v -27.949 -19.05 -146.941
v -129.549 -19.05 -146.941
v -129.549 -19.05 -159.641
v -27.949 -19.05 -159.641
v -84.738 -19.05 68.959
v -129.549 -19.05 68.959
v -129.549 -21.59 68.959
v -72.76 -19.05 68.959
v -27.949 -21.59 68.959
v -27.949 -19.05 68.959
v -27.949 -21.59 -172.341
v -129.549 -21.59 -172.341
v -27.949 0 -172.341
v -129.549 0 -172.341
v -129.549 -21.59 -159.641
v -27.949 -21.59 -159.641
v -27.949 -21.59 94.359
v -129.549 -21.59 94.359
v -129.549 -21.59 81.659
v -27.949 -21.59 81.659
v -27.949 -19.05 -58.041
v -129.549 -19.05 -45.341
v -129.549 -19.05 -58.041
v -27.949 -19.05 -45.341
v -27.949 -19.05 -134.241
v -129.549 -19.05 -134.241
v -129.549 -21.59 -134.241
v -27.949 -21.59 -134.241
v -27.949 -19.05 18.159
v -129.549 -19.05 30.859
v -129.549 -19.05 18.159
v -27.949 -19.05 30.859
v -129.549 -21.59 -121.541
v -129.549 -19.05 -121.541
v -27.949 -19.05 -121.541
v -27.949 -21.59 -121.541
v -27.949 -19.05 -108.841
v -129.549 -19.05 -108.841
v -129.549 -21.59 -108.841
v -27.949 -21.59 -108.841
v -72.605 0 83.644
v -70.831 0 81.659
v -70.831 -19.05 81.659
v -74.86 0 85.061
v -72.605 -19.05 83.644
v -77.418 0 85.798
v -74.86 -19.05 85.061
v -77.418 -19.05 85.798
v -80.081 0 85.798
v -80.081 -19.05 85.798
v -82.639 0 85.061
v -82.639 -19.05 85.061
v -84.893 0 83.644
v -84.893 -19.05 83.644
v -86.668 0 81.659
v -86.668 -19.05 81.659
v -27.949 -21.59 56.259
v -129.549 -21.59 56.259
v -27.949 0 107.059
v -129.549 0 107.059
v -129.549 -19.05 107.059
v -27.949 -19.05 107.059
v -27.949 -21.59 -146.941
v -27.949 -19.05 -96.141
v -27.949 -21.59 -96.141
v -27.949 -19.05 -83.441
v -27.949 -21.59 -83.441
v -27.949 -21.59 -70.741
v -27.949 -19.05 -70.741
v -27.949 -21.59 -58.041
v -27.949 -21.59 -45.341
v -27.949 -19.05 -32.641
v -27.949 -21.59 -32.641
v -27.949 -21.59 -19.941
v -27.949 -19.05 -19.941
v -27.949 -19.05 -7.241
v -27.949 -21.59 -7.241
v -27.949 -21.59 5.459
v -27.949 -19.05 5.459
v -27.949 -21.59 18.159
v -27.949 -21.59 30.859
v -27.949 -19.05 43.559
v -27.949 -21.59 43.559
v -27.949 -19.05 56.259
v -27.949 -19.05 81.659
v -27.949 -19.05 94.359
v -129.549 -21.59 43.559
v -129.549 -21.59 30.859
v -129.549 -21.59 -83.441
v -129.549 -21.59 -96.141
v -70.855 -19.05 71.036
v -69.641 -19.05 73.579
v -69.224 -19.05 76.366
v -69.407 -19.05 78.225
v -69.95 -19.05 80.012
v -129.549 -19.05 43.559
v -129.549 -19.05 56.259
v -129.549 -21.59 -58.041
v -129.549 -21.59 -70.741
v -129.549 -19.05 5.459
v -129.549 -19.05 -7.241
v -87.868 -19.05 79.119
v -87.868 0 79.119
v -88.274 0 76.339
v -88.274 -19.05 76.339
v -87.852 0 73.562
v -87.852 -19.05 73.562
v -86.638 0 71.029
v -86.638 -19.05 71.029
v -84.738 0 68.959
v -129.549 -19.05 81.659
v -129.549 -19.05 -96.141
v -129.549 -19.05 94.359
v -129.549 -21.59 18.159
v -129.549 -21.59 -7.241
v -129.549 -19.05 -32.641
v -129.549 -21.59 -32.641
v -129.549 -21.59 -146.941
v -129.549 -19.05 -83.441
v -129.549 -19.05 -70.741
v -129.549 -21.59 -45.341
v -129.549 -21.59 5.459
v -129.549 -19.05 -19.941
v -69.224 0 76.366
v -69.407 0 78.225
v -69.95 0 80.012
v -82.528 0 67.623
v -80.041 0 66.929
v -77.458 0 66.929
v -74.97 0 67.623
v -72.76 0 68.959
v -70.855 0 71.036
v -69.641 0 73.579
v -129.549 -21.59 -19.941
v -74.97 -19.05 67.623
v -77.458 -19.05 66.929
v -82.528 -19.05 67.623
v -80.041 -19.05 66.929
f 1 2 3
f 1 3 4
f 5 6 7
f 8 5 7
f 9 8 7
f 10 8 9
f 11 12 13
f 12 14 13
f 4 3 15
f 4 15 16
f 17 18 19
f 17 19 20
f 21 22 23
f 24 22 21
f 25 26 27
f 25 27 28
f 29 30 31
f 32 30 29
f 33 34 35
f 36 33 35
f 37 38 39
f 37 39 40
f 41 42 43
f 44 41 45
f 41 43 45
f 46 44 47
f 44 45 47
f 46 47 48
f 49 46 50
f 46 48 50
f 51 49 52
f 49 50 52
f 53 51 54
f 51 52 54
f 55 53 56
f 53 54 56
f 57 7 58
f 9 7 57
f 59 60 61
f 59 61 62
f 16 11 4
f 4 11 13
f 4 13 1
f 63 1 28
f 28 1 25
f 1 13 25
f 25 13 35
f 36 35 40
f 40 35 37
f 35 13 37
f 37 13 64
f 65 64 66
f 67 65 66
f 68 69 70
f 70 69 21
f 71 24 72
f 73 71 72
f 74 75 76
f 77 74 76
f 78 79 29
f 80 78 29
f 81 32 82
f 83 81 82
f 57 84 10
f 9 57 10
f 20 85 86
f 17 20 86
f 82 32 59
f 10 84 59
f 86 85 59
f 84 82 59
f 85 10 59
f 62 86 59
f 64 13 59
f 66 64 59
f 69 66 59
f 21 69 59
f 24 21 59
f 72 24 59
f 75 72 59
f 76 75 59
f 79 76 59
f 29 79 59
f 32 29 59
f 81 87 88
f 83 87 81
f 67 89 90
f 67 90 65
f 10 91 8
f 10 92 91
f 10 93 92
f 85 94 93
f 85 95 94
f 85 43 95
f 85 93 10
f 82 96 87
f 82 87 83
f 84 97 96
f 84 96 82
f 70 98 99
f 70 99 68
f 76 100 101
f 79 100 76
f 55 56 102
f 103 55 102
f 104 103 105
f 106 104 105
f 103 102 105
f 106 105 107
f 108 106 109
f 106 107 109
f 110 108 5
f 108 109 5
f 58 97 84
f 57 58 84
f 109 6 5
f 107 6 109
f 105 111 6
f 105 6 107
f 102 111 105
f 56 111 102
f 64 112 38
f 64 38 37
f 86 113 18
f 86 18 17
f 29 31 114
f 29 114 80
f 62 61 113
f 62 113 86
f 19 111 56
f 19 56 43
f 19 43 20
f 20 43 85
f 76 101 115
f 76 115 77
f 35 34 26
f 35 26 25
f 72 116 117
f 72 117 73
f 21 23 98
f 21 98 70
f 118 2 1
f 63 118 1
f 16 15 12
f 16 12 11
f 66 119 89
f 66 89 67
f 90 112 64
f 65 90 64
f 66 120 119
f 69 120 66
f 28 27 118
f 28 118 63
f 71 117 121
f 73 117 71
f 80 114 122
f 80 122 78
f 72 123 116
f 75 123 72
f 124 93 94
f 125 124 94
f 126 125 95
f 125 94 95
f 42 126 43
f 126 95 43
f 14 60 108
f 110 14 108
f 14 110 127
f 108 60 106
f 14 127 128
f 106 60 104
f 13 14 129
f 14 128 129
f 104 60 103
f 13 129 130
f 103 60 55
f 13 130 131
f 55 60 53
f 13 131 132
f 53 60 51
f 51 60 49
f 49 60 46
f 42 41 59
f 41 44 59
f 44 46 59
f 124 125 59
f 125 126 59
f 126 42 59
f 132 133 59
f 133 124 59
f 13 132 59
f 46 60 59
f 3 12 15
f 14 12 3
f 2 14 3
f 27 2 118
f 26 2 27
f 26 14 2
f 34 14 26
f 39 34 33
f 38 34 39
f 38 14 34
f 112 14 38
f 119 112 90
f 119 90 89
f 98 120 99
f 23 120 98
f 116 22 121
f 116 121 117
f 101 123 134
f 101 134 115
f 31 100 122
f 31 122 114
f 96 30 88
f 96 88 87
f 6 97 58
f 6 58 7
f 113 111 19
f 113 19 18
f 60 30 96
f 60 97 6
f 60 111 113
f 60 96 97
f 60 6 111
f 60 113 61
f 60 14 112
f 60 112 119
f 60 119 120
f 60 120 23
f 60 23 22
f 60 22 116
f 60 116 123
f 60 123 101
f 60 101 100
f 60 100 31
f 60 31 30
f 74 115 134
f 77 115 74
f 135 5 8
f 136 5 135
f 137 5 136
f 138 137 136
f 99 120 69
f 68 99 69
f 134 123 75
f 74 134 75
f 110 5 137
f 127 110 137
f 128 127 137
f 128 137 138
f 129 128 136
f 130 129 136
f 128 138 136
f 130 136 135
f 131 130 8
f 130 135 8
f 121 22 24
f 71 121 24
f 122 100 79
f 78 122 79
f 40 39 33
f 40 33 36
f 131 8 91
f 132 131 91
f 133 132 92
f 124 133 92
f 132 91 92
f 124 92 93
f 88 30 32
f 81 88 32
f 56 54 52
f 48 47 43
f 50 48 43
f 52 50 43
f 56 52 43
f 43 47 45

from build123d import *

# Parameters (mm, degrees)
F0_W     = 101.6
F0_H     = 279.4
F1_DEPTH = 19.05
F2_W     = 101.6
F2_H     = 12.7
F3_DEPTH = 2.54
F5_DEPTH = 25.4


with BuildPart() as f1:
    # F0 (on Front) → F1 (new body)
    with BuildSketch(Plane.XZ):
        with Locations((-78.7492649078, -32.640619709)):
            Rectangle(F0_W, F0_H)
    extrude(amount=F1_DEPTH)

    # F2 (on face) → F3 (join)
    with BuildSketch(Plane.XZ.offset(19.05)):
        with Locations((-78.7492649078, -115.190619709)):
            Rectangle(F2_W, F2_H)
        with Locations((-78.7492649078, -89.790619709)):
            Rectangle(F2_W, F2_H)
        with Locations((-78.7492649078, -64.390619709)):
            Rectangle(F2_W, F2_H)
        with Locations((-78.7492649078, -38.990619709)):
            Rectangle(F2_W, F2_H)
        with Locations((-78.7492649078, -13.590619709)):
            Rectangle(F2_W, F2_H)
        with Locations((-78.7492649078, 11.809380291)):
            Rectangle(F2_W, F2_H)
        with Locations((-78.7492649078, 37.209380291)):
            Rectangle(F2_W, F2_H)
        with Locations((-78.7492649078, 62.609380291)):
            Rectangle(F2_W, F2_H)
        with Locations((-78.7492649078, 88.009380291)):
            Rectangle(F2_W, F2_H)
        with Locations((-78.7492649078, -140.590619709)):
            Rectangle(F2_W, F2_H)
        with Locations((-78.7492649078, -165.990619709)):
            Rectangle(F2_W, F2_H)
    extrude(amount=F3_DEPTH)

    # F4 (on face) → F5 (cut)
    with BuildSketch(Plane.XZ.offset(19.05)):
        with BuildLine():
            Line((-86.6679660434, 81.659380291), (-70.8305637723, 81.659380291))
            ThreePointArc((-70.8305637723, 81.659380291), (-78.7492649078, 85.891007328), (-86.6679660434, 81.659380291))
        make_face()
        with BuildLine():
            ThreePointArc((-84.7382131406, 68.959380291), (-78.7492649078, 66.841007328), (-72.7603166751, 68.959380291))
            Line((-72.7603166751, 68.959380291), (-84.7382131406, 68.959380291))
        make_face()
        with BuildLine():
            ThreePointArc((-72.7603166751, 68.959380291), (-70.1536160982, 72.2622960149), (-69.2242649078, 76.366007328))
            ThreePointArc((-69.2242649078, 76.366007328), (-69.6346817216, 79.1318703655), (-70.8305637723, 81.659380291))
            Line((-70.8305637723, 81.659380291), (-86.6679660434, 81.659380291))
            ThreePointArc((-86.6679660434, 81.659380291), (-88.1661740472, 74.9351169543), (-84.7382131406, 68.959380291))
            Line((-84.7382131406, 68.959380291), (-72.7603166751, 68.959380291))
        make_face()
    extrude(amount=-F5_DEPTH, mode=Mode.SUBTRACT)


solid = f1.part
